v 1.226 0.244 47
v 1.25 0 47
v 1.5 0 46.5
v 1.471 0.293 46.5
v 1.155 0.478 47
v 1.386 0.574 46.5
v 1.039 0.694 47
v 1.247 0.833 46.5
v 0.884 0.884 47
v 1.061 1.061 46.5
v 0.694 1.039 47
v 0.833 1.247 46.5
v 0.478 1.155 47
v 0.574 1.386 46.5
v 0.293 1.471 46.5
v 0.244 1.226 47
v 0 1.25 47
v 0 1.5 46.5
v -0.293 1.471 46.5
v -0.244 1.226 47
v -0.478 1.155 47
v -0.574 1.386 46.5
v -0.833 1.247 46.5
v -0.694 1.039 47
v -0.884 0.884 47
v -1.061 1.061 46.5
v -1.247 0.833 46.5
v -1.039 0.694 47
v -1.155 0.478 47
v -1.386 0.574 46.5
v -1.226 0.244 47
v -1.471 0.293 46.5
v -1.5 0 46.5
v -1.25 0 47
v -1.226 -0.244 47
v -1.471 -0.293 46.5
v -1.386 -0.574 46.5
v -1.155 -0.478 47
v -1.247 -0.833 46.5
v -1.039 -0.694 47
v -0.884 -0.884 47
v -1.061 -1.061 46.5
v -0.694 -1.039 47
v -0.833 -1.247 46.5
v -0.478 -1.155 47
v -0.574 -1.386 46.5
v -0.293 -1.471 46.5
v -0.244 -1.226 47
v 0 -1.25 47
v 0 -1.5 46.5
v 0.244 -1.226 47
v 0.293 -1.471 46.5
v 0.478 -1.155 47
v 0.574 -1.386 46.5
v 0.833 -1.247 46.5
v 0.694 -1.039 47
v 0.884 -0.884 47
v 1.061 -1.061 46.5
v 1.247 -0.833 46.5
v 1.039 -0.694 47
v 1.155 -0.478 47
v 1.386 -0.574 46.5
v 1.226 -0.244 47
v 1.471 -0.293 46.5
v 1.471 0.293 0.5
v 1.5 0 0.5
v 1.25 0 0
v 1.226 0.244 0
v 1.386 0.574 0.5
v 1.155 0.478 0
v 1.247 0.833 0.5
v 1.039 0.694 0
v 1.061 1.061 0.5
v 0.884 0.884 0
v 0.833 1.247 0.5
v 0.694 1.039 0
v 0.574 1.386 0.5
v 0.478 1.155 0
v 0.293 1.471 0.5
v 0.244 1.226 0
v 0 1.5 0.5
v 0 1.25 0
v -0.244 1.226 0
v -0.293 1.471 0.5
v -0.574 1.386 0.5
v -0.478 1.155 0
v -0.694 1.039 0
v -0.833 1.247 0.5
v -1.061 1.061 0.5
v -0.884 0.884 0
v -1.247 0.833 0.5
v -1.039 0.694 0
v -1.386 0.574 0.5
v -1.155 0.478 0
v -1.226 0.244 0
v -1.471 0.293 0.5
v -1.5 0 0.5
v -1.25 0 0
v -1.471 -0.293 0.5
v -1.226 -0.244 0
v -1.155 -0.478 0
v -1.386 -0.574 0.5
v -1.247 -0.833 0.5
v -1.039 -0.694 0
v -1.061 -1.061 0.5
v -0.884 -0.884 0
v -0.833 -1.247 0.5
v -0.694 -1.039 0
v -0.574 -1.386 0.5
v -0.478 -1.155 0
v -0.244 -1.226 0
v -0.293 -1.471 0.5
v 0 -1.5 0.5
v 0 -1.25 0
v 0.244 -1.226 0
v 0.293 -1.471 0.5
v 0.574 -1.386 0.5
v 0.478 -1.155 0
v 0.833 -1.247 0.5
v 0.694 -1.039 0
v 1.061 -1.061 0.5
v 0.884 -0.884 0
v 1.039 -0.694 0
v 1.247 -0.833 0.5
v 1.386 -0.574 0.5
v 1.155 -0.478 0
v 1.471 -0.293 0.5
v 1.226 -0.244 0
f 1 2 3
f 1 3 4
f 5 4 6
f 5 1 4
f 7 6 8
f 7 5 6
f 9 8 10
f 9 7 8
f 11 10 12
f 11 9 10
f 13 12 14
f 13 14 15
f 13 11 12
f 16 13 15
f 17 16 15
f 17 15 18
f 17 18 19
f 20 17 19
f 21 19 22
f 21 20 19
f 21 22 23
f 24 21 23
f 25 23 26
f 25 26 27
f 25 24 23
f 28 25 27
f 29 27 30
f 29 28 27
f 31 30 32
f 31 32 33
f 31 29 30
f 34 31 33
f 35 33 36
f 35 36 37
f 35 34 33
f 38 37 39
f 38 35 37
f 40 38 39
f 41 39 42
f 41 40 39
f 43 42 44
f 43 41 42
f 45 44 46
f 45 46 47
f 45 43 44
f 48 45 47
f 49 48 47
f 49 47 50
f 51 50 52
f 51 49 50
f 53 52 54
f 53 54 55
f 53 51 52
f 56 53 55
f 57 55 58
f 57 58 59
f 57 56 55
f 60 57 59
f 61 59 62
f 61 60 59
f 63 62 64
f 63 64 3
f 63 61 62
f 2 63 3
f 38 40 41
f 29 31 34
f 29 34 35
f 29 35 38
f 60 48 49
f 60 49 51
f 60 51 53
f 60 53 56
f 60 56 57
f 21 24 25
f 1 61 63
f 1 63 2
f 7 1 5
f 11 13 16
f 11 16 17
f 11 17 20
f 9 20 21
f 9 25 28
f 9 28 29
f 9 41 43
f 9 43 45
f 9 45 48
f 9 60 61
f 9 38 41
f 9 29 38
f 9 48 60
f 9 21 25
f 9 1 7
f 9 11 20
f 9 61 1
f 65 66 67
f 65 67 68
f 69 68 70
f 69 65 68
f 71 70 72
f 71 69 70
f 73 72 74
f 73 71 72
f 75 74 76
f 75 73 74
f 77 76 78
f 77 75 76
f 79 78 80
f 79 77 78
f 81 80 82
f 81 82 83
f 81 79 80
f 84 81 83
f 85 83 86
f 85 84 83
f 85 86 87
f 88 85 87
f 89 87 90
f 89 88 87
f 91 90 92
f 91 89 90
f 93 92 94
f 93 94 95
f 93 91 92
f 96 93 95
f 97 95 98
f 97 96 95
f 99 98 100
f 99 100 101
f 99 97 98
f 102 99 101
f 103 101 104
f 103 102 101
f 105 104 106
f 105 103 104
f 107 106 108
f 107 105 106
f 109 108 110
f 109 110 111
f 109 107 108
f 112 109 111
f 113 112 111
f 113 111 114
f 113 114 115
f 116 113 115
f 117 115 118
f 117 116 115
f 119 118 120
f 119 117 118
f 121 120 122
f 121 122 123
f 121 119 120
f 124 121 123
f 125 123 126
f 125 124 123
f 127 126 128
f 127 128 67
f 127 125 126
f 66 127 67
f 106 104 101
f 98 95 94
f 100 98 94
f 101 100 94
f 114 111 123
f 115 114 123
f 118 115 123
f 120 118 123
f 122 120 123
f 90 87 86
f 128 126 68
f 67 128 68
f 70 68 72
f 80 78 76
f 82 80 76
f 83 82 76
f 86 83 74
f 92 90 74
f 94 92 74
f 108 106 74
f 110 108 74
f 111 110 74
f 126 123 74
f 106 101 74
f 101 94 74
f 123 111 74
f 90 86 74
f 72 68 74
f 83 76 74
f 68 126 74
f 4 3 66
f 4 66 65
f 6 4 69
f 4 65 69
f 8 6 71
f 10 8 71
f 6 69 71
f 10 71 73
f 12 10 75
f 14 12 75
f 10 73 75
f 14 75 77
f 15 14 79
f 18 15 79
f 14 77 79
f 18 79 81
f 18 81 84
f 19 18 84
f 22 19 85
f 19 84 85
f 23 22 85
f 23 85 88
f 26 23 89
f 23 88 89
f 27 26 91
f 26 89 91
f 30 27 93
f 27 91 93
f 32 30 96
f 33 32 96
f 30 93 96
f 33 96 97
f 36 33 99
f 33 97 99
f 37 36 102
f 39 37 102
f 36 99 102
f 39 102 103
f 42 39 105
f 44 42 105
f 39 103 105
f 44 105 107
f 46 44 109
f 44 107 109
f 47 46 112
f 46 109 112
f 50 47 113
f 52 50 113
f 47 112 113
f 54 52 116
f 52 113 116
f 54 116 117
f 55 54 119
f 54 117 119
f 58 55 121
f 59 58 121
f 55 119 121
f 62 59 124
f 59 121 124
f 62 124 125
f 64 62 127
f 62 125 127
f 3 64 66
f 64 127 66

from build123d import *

# Parameters (mm, degrees)
SKETCH2_R           = 1.5
BOSS_EXTRUDE1_DEPTH = 47
CHAMFER1_SIZE       = 0.5
CHAMFER1_SIZE2      = 0.25
CHAMFER2_SIZE       = 0.25
CHAMFER2_SIZE2      = 0.5


with BuildPart() as part:
    # Sketch2 → Boss-Extrude1 (new body)
    with BuildSketch(Plane.XY):
        Circle(SKETCH2_R)
    extrude(amount=BOSS_EXTRUDE1_DEPTH)

    # Chamfer1
    chamfer1_edges = [part.edges().sort_by_distance(p)[0] for p in [
        (-1.5, 0, 47),
    ]]
    chamfer1_side = [part.faces().sort_by_distance(p)[0] for p in [
        (-1.5, 0, 23.5),
    ]]
    chamfer(chamfer1_edges, length=CHAMFER1_SIZE, length2=CHAMFER1_SIZE2, reference=chamfer1_side[0])

    # Chamfer2
    chamfer2_edges = [part.edges().sort_by_distance(p)[0] for p in [
        (-1.5, 0, 0),
    ]]
    chamfer2_side = [part.faces().sort_by_distance(p)[0] for p in [
        (0, 0, 0),
    ]]
    chamfer(chamfer2_edges, length=CHAMFER2_SIZE, length2=CHAMFER2_SIZE2, reference=chamfer2_side[0])


solid = part.part
